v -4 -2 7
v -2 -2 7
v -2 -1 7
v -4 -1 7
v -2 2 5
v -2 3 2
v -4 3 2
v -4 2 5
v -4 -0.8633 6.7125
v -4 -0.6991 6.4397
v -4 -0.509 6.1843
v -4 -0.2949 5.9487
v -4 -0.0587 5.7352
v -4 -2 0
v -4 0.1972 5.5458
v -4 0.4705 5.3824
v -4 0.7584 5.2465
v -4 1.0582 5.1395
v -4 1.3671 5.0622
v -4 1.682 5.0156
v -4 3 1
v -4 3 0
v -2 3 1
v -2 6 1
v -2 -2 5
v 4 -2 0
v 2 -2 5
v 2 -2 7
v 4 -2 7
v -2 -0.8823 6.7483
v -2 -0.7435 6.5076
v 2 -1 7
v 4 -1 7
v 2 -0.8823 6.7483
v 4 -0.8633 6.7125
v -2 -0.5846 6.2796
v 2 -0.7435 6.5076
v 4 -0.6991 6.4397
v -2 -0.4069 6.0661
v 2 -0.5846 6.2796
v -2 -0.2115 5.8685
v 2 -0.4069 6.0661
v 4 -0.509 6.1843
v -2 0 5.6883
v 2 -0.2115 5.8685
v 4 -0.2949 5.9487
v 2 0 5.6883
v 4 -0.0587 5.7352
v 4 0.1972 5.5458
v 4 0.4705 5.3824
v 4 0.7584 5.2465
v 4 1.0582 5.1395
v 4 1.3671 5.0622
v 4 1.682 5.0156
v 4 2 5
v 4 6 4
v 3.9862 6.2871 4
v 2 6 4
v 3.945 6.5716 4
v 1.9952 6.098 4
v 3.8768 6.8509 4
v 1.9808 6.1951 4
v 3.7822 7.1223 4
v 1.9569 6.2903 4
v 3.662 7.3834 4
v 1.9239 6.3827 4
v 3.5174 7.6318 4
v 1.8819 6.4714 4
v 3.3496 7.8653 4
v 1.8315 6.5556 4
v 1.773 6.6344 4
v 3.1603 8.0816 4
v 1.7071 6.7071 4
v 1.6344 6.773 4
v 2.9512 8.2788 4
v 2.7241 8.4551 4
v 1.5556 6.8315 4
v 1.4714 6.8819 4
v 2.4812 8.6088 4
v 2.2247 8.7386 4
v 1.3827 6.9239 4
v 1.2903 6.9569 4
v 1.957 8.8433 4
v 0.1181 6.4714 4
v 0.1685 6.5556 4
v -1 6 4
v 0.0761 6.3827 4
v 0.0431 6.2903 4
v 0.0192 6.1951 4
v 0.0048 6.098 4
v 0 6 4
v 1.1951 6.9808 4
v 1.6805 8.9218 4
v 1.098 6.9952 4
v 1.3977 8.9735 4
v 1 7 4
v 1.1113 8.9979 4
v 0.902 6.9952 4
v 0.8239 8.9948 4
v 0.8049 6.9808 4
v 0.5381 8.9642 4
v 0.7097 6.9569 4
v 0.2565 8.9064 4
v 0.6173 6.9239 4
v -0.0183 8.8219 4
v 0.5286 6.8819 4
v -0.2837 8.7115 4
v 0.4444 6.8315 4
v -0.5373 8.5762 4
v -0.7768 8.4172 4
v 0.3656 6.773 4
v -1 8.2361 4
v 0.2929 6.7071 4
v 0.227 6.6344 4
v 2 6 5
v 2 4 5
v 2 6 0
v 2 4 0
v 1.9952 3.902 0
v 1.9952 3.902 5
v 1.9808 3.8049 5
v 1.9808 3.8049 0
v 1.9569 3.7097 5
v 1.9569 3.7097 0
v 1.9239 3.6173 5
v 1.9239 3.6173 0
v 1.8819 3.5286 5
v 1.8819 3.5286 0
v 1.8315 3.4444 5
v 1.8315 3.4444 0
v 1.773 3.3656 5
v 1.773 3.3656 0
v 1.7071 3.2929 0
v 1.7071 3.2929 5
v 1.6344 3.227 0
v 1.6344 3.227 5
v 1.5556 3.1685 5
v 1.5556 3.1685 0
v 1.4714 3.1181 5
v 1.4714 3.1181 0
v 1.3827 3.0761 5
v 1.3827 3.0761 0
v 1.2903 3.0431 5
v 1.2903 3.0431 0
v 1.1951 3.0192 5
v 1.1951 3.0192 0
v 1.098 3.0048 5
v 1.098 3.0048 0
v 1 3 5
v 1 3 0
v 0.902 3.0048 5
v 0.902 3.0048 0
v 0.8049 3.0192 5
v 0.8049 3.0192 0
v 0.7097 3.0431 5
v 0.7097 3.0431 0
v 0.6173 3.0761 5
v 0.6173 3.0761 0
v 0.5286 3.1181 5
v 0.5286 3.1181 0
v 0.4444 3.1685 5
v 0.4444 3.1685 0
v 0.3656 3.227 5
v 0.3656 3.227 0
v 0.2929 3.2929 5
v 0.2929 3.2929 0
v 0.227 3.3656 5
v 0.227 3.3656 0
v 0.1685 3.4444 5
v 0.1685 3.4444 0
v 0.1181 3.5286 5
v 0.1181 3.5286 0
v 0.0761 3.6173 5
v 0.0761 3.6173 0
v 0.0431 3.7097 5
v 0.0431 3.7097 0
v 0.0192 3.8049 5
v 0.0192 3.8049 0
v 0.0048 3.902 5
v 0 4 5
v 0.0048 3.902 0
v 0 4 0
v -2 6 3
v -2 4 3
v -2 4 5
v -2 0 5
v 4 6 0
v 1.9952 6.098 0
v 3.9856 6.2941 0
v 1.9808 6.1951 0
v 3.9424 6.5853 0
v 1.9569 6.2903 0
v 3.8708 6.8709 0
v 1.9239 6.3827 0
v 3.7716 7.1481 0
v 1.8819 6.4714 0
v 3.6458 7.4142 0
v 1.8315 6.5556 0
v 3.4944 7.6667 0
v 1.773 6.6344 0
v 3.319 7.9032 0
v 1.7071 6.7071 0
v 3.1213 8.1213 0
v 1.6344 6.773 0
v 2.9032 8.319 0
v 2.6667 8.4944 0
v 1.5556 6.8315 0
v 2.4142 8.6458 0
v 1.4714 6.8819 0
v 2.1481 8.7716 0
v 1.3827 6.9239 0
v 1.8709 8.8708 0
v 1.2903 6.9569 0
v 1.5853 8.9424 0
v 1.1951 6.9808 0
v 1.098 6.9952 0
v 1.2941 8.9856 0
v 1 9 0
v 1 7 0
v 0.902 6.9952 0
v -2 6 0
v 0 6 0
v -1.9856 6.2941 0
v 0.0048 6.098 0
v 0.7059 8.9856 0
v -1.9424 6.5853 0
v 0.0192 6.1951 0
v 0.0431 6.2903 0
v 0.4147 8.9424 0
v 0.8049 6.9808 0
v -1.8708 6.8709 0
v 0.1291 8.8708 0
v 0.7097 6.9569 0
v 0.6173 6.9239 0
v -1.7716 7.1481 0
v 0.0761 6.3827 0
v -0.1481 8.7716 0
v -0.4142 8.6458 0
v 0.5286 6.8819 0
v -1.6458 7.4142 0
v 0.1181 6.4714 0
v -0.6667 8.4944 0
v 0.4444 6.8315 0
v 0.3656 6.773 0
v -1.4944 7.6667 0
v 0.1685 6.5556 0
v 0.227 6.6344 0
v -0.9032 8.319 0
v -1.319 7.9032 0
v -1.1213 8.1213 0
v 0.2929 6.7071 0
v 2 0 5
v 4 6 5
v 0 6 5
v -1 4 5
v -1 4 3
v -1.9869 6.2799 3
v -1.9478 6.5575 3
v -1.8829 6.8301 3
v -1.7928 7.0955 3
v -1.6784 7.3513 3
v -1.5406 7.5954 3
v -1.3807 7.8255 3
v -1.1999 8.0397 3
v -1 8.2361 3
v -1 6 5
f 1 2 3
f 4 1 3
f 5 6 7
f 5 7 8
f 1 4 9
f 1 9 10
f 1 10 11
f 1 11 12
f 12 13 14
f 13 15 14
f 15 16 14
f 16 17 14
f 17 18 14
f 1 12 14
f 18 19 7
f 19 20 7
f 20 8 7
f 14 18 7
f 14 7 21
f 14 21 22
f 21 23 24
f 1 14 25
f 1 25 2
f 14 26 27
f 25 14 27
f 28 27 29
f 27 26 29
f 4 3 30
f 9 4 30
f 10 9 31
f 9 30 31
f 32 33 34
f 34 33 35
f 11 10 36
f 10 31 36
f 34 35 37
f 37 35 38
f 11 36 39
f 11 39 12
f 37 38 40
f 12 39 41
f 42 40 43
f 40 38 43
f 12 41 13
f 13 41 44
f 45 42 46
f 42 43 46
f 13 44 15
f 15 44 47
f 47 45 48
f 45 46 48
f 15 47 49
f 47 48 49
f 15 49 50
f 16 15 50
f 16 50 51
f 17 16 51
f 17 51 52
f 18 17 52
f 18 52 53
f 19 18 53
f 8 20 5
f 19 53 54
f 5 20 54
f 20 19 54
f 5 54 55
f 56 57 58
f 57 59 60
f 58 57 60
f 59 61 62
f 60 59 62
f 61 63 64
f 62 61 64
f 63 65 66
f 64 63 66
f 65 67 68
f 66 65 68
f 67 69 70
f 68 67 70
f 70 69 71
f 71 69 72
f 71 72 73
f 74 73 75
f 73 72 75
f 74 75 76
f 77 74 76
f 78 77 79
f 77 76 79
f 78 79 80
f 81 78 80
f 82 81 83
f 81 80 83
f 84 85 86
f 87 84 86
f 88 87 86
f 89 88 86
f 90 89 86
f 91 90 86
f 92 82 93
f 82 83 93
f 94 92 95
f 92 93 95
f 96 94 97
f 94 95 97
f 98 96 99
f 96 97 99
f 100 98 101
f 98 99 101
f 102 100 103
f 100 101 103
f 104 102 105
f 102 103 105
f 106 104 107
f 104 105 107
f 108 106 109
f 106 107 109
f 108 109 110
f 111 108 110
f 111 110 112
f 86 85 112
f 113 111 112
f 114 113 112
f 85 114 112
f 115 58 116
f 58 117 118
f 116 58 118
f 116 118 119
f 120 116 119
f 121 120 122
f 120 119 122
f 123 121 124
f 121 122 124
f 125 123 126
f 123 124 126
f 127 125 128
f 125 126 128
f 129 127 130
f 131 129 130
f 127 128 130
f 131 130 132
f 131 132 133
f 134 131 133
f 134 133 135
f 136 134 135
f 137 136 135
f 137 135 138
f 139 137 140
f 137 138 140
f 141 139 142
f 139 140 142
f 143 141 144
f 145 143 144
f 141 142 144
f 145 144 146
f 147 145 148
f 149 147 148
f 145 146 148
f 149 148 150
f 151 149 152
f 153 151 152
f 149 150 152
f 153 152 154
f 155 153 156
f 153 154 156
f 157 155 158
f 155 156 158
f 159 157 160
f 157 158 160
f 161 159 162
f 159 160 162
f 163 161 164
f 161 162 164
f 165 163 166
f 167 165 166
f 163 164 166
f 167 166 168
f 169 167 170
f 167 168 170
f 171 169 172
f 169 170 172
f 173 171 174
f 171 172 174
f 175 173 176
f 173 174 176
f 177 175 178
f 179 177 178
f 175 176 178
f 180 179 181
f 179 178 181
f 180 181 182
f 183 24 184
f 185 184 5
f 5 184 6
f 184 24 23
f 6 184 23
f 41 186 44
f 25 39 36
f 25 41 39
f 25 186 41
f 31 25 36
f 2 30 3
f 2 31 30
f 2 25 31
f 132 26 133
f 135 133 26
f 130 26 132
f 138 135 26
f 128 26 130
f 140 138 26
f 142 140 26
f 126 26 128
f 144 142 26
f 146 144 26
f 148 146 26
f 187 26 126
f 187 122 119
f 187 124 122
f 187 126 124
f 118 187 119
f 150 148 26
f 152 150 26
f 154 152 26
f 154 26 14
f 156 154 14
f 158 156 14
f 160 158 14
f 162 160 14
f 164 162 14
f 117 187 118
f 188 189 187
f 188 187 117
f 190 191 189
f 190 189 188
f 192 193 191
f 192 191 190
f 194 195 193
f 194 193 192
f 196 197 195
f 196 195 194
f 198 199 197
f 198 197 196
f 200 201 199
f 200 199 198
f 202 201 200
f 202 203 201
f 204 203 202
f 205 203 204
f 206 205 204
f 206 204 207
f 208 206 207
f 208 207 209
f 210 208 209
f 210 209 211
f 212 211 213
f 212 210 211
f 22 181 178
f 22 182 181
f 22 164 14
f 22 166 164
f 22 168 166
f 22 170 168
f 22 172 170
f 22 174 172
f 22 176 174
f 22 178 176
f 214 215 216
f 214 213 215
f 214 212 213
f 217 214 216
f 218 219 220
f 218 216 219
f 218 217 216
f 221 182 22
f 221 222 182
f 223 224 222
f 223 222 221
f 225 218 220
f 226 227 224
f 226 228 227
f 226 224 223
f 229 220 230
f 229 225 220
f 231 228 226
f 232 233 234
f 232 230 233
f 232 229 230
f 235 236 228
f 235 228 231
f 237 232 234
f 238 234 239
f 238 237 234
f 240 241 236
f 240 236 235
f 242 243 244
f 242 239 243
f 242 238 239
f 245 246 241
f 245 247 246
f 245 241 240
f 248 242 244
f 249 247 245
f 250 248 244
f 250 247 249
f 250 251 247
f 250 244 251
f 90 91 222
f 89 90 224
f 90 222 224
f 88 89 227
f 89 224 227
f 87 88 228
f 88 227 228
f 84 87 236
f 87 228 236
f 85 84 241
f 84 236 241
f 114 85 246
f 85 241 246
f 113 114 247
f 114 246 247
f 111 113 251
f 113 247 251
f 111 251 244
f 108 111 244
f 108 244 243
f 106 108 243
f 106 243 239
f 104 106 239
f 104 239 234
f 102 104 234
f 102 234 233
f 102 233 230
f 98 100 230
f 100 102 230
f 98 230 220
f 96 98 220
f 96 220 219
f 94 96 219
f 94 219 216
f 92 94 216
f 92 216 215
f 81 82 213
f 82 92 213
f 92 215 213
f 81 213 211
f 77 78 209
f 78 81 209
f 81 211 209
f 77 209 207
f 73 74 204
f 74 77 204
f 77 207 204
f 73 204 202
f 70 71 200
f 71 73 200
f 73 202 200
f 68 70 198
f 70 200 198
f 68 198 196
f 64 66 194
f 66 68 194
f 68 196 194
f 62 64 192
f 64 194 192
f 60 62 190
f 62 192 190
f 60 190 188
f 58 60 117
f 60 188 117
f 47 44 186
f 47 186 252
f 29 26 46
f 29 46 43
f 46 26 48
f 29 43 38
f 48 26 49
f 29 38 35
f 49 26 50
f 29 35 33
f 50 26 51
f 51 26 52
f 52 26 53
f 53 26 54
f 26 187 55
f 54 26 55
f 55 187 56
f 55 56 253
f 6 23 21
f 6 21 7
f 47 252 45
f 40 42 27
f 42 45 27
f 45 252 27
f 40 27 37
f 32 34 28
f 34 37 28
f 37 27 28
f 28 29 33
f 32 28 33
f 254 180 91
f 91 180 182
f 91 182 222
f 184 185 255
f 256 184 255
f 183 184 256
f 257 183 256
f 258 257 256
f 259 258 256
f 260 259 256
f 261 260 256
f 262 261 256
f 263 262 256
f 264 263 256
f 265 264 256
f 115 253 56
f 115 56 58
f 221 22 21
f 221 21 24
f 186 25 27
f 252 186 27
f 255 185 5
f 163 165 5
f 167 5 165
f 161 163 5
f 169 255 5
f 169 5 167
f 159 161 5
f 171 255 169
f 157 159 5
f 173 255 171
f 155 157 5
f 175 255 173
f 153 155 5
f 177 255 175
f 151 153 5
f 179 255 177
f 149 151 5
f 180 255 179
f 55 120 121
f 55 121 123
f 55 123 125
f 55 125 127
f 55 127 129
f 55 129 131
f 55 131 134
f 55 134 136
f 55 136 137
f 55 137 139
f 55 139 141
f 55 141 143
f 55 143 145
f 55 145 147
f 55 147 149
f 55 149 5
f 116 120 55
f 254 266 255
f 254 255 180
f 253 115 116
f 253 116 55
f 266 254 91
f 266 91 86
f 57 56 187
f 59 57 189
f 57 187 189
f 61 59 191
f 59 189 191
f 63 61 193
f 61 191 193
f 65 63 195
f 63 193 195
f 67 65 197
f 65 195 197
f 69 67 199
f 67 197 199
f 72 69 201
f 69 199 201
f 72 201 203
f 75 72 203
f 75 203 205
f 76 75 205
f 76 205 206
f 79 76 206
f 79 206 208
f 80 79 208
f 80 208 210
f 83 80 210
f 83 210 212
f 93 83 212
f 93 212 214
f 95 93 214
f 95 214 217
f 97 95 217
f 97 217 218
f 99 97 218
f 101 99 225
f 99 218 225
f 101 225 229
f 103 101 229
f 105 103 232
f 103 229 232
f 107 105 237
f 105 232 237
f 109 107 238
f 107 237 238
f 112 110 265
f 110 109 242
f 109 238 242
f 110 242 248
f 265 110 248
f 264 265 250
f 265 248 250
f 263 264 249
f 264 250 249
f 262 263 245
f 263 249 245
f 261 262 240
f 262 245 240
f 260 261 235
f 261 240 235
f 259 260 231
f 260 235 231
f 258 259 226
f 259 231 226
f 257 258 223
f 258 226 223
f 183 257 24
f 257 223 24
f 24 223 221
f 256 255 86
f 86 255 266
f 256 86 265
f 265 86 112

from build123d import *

# Parameters (mm, degrees)
BOSS_EXTRUDE2_DEPTH = 5
BOSS_EXTRUDE3_DEPTH = 8
SKETCH4_W           = 4
SKETCH4_H           = 2
CUT_EXTRUDE2_DEPTH  = 2
CUT_EXTRUDE3_DEPTH  = 1
CUT_EXTRUDE4_DEPTH  = 2
BOSS_EXTRUDE4_DEPTH = 1
BOSS_EXTRUDE5_DEPTH = 2


with BuildPart() as part:
    # Sketch1 → Boss-Extrude2 (new body)
    with BuildSketch(Plane.XY):
        with BuildLine():
            Line((4, 2), (4, 6))
            ThreePointArc((4, 6), (1, 9), (-2, 6))
            Line((-2, 6), (-2, 2))
            Line((-2, 2), (-4, 2))
            Line((-4, 2), (-4, -2))
            Line((-4, -2), (4, -2))
            Line((4, -2), (4, 2))
        make_face()
        with BuildLine():
            Line((2, 6), (2, 4))
            ThreePointArc((2, 4), (1, 3), (0, 4))
            Line((0, 4), (0, 6))
            ThreePointArc((0, 6), (1, 7), (2, 6))
        make_face(mode=Mode.SUBTRACT)
    extrude(amount=BOSS_EXTRUDE2_DEPTH)

    # Sketch2 → Boss-Extrude3 (add)
    with BuildSketch(Plane(origin=(4, 0, 0), x_dir=(0, 0, -1), z_dir=(1, 0, 0))):
        with BuildLine():
            Line((-5, -2), (-7, -2))
            Line((-7, -2), (-7, -1))
            ThreePointArc((-7, -1), (-5.545836543, 0.197224362), (-5, 2))
            Line((-5, 2), (-5, -2))
        make_face()
    extrude(amount=-BOSS_EXTRUDE3_DEPTH)

    # Sketch4 → Cut-Extrude2 (cut)
    with BuildSketch(Plane.XZ.offset(2)):
        with Locations((0, 6)):
            Rectangle(SKETCH4_W, SKETCH4_H)
    extrude(amount=-CUT_EXTRUDE2_DEPTH, mode=Mode.SUBTRACT)

    # Sketch5 → Cut-Extrude3 (cut)
    with BuildSketch(Plane.XY.offset(5)):
        with BuildLine():
            Line((4, 6), (2, 6))
            ThreePointArc((2, 6), (1, 7), (0, 6))
            Line((0, 6), (-2, 6))
            ThreePointArc((-2, 6), (1, 9), (4, 6))
        make_face()
    extrude(amount=-CUT_EXTRUDE3_DEPTH, mode=Mode.SUBTRACT)

    # Sketch6 → Cut-Extrude4 (cut)
    with BuildSketch(Plane.XY.offset(5)):
        with BuildLine():
            Line((-2, 4), (-1, 4))
            Line((-1, 4), (-1, 8.236067977))
            ThreePointArc((-1, 8.236067977), (-1.738612788, 7.224744871), (-2, 6))
            Line((-2, 6), (-2, 4))
        make_face()
    extrude(amount=-CUT_EXTRUDE4_DEPTH, mode=Mode.SUBTRACT)

    # Sketch7 → Boss-Extrude4 (add)
    with BuildSketch(Plane(origin=(0, 0, 0), x_dir=(-1, 0, 0), z_dir=(0, 0, -1))):
        Polygon((4, 2), (4, 3), (2, 6), (2, 2), align=None)
    extrude(amount=-BOSS_EXTRUDE4_DEPTH)

    # Sketch8 → Boss-Extrude5 (add)
    with BuildSketch(Plane.ZY.offset(2)):
        Polygon((1, 2), (1, 3), (2, 3), (5, 2), align=None)
    extrude(amount=BOSS_EXTRUDE5_DEPTH)


solid = part.part
